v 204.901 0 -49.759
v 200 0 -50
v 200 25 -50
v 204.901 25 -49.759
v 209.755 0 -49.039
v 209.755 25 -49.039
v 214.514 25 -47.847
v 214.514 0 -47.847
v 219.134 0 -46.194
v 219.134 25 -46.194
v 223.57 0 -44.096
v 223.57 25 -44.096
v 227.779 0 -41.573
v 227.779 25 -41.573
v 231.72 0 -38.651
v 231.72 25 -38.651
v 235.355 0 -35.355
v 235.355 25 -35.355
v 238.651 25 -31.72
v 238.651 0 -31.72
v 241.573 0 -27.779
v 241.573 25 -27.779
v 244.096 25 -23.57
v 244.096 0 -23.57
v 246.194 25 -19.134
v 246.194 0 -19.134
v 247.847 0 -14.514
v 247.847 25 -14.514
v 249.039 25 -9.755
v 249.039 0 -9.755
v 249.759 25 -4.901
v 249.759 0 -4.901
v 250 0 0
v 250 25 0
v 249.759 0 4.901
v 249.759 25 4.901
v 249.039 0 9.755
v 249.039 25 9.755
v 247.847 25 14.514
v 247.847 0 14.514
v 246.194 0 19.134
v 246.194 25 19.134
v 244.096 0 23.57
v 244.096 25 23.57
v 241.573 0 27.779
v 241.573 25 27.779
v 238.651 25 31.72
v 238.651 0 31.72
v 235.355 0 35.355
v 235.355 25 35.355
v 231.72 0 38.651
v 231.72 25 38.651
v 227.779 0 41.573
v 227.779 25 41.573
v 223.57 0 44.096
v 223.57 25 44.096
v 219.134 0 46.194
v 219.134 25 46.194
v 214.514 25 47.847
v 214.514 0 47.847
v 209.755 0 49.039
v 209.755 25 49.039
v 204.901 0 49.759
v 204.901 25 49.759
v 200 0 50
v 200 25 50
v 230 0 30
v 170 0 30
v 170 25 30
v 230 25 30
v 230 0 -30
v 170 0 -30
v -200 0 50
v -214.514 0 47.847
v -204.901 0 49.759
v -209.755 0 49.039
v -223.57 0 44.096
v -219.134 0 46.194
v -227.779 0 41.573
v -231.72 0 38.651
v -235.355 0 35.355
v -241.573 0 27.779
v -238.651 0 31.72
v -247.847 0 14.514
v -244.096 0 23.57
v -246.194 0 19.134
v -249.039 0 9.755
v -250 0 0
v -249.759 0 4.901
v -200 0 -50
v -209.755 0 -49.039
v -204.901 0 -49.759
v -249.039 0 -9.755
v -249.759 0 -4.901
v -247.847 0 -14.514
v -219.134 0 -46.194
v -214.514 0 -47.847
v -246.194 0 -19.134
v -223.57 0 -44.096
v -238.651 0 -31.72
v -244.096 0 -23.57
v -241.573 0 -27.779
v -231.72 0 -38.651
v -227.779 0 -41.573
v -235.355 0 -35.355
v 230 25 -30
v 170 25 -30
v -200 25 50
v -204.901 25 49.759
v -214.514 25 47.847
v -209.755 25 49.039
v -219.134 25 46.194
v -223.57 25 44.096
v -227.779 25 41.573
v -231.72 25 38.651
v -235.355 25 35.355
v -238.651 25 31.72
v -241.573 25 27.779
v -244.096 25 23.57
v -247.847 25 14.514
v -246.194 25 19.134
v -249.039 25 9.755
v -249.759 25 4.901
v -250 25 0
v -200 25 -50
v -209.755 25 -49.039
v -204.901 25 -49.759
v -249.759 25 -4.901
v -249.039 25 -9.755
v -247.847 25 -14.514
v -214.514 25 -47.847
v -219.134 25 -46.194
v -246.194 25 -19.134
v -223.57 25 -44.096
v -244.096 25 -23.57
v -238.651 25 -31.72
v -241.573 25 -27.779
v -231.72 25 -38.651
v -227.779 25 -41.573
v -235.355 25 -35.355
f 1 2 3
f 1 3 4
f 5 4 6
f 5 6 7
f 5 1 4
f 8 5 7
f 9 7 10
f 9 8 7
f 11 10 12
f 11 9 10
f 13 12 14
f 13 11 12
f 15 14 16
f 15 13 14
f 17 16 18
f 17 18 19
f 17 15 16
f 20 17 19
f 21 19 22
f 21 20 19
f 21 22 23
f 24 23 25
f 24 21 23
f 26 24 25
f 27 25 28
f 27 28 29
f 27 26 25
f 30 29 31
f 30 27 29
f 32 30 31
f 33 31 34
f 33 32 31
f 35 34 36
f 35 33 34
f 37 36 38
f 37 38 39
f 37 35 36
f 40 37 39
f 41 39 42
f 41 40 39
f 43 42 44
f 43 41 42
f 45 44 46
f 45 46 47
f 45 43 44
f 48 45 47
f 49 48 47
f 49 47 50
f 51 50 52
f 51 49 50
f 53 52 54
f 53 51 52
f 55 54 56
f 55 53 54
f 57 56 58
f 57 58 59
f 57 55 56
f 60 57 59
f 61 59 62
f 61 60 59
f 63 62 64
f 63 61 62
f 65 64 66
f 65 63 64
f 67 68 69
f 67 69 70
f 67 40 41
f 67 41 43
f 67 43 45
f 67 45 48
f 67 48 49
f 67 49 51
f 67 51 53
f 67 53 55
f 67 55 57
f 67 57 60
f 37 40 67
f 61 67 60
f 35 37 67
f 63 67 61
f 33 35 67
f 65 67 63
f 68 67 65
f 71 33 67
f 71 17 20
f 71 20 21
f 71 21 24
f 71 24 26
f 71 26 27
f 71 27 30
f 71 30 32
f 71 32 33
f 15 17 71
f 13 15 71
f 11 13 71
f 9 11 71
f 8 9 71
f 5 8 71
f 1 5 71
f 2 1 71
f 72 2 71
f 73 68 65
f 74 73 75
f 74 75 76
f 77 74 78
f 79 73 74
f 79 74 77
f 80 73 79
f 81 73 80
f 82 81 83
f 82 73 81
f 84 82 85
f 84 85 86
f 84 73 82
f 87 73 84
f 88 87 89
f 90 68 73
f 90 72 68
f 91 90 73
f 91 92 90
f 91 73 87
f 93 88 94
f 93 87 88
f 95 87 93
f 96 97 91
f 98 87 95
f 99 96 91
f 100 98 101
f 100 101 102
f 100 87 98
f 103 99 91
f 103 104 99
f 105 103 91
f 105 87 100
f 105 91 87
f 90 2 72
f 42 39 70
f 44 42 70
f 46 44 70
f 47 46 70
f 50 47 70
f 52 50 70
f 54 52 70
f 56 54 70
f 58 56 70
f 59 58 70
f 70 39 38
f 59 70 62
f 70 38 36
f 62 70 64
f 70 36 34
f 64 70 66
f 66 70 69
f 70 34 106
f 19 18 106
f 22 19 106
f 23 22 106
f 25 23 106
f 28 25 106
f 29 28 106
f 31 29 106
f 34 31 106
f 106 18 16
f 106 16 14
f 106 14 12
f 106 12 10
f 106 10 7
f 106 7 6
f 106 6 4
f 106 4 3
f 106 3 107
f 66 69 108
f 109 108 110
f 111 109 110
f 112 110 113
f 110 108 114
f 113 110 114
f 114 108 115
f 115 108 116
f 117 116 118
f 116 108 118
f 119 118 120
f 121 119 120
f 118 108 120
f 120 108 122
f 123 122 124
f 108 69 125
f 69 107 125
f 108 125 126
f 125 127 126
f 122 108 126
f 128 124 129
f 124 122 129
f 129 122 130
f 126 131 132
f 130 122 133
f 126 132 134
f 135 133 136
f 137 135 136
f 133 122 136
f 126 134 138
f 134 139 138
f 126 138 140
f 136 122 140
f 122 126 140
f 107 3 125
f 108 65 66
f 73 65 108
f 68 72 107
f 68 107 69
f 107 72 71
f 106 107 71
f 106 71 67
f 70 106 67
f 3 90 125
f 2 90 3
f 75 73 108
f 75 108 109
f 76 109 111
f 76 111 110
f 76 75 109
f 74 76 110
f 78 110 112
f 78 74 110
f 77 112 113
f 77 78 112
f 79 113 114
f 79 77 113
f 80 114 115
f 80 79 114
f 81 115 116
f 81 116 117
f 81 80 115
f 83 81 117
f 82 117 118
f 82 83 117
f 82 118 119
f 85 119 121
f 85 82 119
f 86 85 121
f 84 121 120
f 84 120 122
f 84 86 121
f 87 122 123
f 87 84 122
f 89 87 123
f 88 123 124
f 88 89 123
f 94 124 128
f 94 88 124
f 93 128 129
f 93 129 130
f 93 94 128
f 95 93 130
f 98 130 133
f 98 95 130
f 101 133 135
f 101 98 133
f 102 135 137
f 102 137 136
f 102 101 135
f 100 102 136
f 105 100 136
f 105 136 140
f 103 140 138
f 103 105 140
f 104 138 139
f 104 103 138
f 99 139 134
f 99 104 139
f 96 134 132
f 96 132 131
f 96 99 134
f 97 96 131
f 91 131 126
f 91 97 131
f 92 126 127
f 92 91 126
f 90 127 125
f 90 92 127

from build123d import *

# Parameters (mm, degrees)
EXTRUDE_1_DEPTH     = 25
SKETCH_3_W          = 60
SKETCH_3_H          = 60
CUT_EXTRUDE_1_DEPTH = 25


with BuildPart() as part:
    # 草图1 → 凸台-拉伸1 (new body)
    with BuildSketch(Plane(origin=(0, 0, 0), x_dir=(1, 0, 0), z_dir=(0, 1, 0))):
        with BuildLine():
            Line((-200, 50), (200, 50))
            ThreePointArc((200, 50), (250, 0), (200, -50))
            Line((200, -50), (-200, -50))
            ThreePointArc((-200, -50), (-250, 0), (-200, 50))
        make_face()
    extrude(amount=EXTRUDE_1_DEPTH)

    # 草图3 → 切除-拉伸1 (cut)
    with BuildSketch(Plane.XZ):
        with Locations((200, 0)):
            Rectangle(SKETCH_3_W, SKETCH_3_H)
    extrude(amount=-CUT_EXTRUDE_1_DEPTH, mode=Mode.SUBTRACT)


solid = part.part
